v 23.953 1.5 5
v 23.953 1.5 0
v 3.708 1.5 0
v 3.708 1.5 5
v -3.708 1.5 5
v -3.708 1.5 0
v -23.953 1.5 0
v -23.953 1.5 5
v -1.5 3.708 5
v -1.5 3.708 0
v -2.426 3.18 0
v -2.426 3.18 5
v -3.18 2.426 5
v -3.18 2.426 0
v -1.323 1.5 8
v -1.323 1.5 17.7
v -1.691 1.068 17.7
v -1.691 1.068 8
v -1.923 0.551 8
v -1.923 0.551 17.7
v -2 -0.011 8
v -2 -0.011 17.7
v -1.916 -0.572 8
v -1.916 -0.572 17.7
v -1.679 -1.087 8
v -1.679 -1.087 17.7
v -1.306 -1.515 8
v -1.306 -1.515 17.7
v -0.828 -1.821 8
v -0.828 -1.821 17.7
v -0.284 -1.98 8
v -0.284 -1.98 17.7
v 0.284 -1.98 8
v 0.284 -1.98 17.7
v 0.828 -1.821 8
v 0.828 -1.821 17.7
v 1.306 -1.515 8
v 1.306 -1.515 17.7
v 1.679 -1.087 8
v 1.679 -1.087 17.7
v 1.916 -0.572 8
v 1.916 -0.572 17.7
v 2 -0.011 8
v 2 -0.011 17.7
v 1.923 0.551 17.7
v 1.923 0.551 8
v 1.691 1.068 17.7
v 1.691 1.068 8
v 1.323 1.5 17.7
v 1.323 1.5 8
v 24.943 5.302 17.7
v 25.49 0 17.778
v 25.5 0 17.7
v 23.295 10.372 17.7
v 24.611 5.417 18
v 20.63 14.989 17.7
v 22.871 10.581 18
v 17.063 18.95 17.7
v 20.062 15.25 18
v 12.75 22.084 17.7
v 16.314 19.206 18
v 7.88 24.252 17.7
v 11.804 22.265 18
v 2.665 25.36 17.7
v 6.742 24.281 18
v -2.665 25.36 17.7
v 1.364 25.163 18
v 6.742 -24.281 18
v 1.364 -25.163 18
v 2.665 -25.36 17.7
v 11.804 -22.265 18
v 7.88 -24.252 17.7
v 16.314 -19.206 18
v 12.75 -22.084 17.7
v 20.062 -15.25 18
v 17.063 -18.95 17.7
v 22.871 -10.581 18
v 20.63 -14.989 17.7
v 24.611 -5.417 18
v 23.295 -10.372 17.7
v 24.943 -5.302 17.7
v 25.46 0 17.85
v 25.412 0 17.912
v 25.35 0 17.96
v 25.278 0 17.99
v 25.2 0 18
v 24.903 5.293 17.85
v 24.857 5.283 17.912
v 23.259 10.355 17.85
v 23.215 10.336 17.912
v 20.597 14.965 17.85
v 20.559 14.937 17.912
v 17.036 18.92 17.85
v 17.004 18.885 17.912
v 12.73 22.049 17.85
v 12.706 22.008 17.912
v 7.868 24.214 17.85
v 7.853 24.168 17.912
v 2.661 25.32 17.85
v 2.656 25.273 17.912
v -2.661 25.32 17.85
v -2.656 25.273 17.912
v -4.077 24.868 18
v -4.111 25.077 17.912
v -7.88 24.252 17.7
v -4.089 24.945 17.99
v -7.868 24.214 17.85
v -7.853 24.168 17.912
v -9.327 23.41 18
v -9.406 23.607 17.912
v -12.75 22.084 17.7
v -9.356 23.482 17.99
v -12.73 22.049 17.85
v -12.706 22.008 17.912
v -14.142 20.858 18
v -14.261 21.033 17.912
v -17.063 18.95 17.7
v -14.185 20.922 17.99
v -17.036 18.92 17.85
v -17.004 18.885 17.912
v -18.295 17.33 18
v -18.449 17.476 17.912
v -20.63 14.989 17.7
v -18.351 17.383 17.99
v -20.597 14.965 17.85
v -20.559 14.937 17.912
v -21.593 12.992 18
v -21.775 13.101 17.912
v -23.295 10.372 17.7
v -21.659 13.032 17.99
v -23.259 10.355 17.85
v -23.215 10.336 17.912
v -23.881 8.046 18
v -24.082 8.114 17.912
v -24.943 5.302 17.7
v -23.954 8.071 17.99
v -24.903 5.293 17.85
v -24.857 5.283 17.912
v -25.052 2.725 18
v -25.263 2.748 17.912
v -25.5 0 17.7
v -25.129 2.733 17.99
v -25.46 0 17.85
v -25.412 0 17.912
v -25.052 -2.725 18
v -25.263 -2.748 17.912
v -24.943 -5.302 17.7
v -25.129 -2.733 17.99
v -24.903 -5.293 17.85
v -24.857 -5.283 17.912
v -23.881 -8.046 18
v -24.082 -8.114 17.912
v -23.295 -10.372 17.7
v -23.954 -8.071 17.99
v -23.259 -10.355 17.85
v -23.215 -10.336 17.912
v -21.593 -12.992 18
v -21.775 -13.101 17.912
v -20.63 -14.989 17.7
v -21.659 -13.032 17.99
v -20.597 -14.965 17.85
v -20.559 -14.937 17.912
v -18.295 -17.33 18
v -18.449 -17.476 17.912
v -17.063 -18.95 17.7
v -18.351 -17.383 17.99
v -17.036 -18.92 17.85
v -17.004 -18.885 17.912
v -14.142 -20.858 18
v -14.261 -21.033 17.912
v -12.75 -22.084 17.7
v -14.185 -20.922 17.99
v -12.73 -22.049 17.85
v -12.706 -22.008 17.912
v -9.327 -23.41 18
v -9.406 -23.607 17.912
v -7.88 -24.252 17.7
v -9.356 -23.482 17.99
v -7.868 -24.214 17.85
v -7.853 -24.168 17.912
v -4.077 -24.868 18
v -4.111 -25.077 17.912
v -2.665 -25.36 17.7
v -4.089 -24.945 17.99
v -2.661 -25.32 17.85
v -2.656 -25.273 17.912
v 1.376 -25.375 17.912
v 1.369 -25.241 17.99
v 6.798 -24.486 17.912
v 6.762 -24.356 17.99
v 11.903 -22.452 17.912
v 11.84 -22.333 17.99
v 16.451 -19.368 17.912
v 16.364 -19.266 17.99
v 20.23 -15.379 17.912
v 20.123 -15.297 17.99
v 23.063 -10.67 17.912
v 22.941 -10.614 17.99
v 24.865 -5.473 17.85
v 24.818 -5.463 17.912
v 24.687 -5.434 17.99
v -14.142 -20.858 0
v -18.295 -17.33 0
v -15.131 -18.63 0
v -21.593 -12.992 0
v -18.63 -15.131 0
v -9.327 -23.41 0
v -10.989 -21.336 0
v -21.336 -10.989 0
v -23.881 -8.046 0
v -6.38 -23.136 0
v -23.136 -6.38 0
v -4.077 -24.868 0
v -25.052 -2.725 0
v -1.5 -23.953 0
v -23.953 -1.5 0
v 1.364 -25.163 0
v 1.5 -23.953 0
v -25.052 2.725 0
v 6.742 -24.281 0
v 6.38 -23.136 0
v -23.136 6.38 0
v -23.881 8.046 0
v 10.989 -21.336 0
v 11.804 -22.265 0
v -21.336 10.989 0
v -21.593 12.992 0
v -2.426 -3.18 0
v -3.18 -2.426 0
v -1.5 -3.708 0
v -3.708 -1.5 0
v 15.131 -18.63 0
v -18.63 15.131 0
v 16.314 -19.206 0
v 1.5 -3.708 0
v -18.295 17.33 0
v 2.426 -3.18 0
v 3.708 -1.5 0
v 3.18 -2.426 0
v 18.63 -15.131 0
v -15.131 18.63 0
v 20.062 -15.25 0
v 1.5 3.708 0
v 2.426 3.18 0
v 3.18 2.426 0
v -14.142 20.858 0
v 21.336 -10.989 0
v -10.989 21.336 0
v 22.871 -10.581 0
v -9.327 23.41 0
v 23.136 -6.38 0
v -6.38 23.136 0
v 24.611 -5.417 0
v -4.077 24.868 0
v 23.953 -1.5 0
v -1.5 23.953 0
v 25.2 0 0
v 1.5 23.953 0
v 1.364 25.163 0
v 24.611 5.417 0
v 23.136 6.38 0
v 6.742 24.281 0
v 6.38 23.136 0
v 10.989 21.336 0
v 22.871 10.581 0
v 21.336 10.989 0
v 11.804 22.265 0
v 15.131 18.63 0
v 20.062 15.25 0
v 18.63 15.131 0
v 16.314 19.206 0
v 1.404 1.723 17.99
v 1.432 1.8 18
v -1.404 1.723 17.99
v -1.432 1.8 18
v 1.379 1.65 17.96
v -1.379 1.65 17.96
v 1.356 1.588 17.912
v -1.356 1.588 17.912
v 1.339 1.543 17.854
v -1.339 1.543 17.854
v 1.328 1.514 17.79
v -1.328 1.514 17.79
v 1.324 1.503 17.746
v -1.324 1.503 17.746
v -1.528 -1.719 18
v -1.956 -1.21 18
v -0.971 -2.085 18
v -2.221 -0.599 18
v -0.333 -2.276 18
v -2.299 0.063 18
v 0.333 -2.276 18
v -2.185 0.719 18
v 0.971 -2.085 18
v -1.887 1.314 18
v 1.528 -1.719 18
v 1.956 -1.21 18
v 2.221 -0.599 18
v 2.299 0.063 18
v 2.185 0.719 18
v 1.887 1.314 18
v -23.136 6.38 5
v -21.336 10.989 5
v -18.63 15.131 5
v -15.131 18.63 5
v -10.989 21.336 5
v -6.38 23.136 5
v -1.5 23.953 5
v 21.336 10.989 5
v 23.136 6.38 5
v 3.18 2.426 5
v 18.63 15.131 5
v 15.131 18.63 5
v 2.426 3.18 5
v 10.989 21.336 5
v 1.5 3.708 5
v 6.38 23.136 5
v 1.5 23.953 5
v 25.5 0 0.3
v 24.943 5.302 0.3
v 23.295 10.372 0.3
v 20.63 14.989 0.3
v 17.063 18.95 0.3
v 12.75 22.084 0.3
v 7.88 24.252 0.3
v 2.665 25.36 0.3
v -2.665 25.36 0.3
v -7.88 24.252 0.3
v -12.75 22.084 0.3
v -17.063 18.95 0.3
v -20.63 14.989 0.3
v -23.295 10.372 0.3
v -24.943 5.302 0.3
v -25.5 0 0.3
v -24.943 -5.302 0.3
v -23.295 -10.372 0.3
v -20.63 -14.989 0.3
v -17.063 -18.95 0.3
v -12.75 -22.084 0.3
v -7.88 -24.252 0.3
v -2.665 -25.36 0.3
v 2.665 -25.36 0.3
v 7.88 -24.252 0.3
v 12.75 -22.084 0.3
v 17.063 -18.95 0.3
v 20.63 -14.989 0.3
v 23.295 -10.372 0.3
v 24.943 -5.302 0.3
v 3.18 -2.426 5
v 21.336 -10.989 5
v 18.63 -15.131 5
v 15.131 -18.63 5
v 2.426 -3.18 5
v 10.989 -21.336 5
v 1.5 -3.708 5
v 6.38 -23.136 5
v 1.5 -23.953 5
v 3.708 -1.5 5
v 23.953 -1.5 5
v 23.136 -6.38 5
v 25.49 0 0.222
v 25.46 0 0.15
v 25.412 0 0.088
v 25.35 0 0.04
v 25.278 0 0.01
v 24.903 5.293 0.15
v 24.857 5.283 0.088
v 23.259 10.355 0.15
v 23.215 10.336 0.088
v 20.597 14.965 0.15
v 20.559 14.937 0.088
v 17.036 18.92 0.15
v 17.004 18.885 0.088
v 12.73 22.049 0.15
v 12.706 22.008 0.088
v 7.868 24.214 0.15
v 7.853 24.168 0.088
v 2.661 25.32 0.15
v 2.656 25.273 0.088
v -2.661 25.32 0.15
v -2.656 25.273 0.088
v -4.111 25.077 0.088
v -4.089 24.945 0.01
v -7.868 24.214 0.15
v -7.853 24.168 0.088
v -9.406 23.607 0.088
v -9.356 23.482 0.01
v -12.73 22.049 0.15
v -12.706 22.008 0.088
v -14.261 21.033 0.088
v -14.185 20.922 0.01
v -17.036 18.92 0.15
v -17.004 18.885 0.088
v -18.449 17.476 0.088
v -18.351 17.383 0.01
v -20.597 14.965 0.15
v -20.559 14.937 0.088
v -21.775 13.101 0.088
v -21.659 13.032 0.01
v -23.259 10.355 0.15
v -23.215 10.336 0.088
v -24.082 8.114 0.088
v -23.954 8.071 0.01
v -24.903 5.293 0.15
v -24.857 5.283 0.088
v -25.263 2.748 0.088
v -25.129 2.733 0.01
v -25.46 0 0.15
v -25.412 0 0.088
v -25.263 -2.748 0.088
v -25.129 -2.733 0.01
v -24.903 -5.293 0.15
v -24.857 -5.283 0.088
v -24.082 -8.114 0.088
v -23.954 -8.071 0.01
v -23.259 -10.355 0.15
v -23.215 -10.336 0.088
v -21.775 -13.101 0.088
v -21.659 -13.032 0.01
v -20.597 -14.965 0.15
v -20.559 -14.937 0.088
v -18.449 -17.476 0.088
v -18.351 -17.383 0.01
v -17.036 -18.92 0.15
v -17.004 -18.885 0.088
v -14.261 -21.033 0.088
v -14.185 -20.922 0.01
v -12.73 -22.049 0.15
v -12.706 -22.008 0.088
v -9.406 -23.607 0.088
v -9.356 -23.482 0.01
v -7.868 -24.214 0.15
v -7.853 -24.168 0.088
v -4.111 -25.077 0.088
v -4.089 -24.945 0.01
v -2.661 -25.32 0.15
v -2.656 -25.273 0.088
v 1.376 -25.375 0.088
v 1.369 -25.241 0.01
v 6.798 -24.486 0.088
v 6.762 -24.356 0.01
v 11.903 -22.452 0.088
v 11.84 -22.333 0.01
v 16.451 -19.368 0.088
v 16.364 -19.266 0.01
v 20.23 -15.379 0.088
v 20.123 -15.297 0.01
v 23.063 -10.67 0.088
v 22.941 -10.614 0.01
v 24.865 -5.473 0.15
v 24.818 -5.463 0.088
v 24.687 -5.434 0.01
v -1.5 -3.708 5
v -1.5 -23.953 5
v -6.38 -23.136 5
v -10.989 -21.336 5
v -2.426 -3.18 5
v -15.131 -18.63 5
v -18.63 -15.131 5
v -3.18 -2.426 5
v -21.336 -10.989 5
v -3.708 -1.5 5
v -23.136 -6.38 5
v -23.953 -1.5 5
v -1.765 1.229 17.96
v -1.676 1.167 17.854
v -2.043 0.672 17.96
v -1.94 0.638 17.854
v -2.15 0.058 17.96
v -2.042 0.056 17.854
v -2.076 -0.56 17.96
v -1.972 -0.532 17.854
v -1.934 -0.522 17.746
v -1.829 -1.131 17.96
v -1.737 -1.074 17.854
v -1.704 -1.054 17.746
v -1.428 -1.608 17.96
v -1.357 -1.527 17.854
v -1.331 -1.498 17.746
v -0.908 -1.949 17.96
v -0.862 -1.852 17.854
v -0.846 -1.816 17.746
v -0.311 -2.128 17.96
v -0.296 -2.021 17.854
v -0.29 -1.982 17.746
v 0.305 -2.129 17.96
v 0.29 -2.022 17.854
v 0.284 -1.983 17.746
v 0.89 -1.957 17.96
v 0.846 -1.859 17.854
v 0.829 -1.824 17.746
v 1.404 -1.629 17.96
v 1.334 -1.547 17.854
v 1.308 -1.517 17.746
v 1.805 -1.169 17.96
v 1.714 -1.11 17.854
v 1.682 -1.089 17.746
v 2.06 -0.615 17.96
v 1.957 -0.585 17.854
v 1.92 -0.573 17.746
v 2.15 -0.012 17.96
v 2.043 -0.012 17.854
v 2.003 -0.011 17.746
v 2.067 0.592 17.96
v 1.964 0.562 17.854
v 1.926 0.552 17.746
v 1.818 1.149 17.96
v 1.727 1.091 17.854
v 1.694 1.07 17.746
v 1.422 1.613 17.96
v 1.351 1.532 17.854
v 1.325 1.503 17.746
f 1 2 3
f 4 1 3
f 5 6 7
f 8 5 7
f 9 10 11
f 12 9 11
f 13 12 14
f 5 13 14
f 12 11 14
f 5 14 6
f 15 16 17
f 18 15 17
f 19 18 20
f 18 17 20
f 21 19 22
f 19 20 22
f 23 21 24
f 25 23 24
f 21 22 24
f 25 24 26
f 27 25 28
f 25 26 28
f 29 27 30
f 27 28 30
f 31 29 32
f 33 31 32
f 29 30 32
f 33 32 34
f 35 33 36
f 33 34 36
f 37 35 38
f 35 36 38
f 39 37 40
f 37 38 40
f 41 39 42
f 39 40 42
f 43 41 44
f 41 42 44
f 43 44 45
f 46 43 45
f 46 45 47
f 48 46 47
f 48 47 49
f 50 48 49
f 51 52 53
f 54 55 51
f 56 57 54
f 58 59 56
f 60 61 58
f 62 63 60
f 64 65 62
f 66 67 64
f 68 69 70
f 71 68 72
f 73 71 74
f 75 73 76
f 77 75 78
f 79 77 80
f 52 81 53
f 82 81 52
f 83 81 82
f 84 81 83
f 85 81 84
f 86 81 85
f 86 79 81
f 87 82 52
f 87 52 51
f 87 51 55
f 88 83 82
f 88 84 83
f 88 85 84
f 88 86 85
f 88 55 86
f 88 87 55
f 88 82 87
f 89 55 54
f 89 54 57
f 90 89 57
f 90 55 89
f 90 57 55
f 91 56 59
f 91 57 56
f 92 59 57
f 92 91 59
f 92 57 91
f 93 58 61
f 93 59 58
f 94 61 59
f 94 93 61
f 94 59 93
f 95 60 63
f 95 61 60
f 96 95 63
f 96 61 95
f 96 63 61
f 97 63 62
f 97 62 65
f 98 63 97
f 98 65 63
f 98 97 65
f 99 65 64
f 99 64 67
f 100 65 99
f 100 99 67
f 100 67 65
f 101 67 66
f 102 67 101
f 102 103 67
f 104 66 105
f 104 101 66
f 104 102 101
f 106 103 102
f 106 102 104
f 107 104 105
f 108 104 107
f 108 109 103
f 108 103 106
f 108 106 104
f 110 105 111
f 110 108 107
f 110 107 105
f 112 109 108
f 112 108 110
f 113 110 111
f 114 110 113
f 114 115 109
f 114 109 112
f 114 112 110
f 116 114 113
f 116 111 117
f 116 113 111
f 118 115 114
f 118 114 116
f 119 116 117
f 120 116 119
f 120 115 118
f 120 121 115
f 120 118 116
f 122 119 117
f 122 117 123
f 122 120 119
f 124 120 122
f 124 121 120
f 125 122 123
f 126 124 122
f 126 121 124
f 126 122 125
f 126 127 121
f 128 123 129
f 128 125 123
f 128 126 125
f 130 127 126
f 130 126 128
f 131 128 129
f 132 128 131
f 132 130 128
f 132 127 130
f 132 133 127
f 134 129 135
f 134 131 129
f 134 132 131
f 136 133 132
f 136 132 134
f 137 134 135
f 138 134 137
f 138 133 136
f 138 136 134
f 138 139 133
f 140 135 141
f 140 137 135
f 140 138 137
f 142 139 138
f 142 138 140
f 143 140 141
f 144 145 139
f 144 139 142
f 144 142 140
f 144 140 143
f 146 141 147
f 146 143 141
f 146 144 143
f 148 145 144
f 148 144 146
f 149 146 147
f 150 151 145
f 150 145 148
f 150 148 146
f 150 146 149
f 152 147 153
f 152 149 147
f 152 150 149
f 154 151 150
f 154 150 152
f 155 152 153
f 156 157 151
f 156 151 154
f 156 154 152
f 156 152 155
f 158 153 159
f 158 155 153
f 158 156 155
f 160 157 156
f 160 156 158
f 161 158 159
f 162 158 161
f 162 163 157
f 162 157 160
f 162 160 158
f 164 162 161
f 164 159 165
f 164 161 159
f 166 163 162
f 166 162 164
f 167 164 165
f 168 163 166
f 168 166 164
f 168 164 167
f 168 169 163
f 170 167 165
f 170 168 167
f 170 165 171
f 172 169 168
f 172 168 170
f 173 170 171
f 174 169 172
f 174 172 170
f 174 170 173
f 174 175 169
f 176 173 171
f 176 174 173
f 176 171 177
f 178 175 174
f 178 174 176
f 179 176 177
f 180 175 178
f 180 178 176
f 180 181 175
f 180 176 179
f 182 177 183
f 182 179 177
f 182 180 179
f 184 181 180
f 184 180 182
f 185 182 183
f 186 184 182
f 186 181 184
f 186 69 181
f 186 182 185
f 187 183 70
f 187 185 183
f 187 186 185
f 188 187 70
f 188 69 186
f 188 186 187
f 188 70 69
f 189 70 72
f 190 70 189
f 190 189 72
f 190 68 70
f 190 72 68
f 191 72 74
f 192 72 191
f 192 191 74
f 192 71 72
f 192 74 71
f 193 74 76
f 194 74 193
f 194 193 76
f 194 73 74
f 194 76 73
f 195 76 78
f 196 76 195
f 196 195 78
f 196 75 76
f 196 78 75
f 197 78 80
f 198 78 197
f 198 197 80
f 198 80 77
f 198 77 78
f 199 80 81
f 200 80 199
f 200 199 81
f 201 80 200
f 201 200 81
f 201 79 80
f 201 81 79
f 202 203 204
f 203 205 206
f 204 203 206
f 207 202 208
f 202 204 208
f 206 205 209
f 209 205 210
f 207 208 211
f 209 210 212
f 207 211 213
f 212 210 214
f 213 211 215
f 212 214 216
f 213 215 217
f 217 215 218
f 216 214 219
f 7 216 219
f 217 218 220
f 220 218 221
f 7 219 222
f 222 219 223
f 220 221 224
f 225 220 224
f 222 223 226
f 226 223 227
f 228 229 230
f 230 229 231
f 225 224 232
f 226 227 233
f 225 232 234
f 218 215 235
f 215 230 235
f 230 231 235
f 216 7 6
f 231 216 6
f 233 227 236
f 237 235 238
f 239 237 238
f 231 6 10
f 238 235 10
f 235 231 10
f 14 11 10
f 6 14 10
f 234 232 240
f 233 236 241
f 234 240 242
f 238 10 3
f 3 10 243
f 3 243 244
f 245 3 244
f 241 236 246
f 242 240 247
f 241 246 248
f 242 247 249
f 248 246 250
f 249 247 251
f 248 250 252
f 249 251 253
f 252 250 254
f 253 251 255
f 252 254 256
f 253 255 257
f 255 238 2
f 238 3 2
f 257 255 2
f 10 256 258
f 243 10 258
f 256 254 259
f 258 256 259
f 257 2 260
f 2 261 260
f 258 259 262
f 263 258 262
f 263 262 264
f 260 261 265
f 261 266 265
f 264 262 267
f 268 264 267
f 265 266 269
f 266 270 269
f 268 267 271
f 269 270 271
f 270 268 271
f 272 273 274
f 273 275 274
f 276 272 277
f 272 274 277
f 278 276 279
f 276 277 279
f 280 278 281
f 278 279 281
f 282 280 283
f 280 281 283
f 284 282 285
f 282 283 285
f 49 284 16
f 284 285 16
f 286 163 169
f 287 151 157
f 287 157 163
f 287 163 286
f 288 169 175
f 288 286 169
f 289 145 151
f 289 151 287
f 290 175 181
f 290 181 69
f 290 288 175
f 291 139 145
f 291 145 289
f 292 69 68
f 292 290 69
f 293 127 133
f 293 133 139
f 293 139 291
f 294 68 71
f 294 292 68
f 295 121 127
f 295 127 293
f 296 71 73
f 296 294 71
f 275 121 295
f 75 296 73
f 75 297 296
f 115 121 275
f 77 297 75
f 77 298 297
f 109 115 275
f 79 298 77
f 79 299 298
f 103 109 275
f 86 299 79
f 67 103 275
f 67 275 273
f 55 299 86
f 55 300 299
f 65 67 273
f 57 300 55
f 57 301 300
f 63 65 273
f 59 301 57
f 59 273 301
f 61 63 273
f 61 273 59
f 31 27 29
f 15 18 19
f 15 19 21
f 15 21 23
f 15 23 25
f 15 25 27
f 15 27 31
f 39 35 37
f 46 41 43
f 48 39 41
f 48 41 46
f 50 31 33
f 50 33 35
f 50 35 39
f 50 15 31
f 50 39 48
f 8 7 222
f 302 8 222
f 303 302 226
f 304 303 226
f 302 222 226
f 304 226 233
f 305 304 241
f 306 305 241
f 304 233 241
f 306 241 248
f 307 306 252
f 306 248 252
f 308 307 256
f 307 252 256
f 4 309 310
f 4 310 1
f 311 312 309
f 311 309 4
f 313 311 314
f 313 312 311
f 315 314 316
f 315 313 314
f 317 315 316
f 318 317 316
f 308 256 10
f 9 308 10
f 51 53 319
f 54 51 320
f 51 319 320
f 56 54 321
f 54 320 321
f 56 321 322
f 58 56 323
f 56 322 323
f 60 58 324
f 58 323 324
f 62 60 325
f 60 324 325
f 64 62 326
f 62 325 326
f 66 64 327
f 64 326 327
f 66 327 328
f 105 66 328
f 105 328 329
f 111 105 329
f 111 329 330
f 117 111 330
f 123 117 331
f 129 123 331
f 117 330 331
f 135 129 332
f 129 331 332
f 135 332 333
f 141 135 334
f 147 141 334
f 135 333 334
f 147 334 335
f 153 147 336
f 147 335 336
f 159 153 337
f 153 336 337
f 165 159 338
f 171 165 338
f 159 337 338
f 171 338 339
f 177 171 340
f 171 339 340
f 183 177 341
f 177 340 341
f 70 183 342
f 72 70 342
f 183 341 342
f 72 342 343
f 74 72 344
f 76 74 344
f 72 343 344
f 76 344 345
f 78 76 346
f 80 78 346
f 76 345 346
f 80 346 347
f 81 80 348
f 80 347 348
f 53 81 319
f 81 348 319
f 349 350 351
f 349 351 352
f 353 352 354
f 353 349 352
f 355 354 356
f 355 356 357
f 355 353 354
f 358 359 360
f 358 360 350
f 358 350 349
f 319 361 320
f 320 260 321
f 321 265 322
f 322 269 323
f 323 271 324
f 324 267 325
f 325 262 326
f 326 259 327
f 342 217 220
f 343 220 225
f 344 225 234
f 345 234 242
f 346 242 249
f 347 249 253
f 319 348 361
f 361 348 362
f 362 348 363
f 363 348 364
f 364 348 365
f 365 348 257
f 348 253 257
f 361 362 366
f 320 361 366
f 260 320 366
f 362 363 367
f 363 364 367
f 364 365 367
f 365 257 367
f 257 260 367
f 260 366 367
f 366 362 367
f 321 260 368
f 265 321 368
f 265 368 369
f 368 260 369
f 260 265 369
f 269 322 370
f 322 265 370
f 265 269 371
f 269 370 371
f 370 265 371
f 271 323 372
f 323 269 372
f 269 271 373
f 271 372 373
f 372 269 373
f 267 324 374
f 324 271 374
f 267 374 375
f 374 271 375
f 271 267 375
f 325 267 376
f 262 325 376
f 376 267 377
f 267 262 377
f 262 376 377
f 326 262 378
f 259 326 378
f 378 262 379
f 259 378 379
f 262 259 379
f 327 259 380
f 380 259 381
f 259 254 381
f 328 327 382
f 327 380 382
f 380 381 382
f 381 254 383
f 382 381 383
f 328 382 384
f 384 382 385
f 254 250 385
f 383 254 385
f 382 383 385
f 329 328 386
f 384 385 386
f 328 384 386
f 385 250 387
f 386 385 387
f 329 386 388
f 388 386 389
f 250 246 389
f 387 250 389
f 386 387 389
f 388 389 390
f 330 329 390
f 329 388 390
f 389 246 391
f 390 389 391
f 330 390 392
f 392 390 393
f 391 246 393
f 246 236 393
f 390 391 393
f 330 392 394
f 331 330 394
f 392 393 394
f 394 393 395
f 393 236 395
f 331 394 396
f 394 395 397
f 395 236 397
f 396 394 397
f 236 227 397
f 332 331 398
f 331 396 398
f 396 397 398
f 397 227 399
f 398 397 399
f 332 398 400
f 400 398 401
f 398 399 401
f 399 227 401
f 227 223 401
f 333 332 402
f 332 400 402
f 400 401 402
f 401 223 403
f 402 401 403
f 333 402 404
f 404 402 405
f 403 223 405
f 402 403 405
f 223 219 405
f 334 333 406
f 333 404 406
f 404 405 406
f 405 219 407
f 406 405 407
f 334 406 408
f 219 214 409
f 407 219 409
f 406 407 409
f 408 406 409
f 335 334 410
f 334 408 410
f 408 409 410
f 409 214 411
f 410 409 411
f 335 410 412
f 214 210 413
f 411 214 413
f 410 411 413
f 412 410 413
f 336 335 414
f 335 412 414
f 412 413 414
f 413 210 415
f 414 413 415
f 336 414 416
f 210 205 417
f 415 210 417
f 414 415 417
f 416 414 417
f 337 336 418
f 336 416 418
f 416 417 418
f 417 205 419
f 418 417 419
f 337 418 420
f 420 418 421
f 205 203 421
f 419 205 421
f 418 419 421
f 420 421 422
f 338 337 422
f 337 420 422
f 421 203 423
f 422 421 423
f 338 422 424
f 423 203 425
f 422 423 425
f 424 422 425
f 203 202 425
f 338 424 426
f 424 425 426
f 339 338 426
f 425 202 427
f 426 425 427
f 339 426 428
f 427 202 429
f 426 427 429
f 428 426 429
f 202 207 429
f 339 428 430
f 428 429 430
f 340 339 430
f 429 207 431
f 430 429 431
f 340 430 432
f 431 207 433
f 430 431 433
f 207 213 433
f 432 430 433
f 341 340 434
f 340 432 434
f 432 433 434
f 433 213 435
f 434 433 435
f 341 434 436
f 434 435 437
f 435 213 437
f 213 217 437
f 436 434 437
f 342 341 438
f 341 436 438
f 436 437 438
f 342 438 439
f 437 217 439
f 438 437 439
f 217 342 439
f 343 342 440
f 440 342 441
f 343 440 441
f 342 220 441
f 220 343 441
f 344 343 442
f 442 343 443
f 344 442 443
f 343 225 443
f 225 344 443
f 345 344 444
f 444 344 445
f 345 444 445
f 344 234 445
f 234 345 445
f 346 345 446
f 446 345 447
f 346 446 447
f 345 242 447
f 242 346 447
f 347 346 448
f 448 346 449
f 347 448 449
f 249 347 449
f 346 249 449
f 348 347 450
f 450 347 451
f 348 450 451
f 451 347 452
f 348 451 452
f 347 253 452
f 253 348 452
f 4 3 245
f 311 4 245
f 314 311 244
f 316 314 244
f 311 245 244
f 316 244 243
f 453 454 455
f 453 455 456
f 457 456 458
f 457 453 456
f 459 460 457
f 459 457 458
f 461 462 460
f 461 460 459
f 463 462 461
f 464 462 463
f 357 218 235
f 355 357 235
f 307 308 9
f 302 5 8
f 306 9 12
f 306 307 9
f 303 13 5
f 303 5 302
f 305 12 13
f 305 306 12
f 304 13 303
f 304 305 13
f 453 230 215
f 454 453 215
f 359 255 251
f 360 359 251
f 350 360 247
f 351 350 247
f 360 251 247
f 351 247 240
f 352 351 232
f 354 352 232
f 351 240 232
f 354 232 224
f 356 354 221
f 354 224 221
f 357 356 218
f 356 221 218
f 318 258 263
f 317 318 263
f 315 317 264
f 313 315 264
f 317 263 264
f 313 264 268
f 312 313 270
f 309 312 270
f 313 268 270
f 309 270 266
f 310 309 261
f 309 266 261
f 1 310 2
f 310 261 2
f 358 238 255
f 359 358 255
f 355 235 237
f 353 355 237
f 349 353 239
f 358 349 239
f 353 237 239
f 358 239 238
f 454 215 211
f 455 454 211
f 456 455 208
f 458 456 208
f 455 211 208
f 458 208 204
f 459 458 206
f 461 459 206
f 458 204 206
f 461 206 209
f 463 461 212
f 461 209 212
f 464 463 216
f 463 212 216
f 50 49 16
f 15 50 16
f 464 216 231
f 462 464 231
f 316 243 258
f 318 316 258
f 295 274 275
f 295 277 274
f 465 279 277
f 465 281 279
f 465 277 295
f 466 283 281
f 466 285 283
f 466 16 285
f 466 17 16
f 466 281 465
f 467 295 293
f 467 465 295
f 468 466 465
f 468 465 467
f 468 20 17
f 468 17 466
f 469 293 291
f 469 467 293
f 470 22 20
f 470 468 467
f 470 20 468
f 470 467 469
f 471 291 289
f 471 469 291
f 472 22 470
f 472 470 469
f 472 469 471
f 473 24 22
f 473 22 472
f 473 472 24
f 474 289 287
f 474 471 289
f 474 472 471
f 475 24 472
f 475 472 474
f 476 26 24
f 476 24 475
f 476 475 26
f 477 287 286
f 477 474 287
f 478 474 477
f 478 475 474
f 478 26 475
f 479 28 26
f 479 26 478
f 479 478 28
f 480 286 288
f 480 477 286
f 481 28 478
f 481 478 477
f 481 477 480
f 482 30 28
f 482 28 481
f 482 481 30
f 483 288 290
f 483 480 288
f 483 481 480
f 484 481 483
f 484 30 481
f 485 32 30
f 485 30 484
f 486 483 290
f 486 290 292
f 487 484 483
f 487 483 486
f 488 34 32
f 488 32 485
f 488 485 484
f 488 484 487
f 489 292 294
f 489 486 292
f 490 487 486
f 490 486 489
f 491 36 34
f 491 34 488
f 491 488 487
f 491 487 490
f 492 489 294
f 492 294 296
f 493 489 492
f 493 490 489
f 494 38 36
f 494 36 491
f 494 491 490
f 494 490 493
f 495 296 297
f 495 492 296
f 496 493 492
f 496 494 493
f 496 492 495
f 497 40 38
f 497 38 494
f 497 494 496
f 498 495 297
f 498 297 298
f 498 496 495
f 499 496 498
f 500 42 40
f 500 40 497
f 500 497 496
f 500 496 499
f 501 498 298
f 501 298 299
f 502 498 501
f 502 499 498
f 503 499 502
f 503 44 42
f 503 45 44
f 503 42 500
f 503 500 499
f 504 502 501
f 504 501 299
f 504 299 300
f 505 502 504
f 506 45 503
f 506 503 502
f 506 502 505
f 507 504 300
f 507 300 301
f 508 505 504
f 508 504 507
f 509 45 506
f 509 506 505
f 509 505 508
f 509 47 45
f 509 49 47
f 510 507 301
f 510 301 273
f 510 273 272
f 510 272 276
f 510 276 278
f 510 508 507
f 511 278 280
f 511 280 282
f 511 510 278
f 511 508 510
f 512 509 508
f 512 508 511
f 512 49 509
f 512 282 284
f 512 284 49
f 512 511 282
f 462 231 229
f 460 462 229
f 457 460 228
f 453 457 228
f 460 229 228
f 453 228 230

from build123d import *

# Parameters (mm, degrees)
ESQUISSE1_R             = 25.5
BOSS_EXTRU_1_DEPTH      = 18
ENL_V_MAT_EXTRU_2_DEPTH = 10
ENL_V_MAT_EXTRU_4_DEPTH = 5
CONG_1_R                = 0.3


with BuildPart() as part:
    # Esquisse1 → Boss.-Extru.1 (new body)
    with BuildSketch(Plane.XY):
        Circle(ESQUISSE1_R)
    extrude(amount=BOSS_EXTRU_1_DEPTH)

    # Esquisse2 → Enlèv. mat.-Extru.2 (cut)
    with BuildSketch(Plane.XY.offset(18)):
        with BuildLine():
            Line((1.322875656, 1.5), (-1.322875656, 1.5))
            ThreePointArc((-1.322875656, 1.5), (0, -2), (1.322875656, 1.5))
        make_face()
    extrude(amount=-ENL_V_MAT_EXTRU_2_DEPTH, mode=Mode.SUBTRACT)

    # Esquisse3 → Enlèv. mat.-Extru.4 (cut)
    with BuildSketch(Plane(origin=(0, 0, 0), x_dir=(-1, 0, 0), z_dir=(0, 0, -1))):
        with BuildLine():
            ThreePointArc((1.5, 3.708324452), (2.828574751, 2.828574751), (3.708324452, 1.5))
            Line((3.708324452, 1.5), (23.953079134, 1.5))
            ThreePointArc((23.953079134, 1.5), (16.970562748, 16.970562748), (1.5, 23.953079134))
            Line((1.5, 23.953079134), (1.5, 3.708324452))
        make_face()
        with BuildLine():
            Line((-23.953079134, 1.5), (-3.708324452, 1.5))
            ThreePointArc((-3.708324452, 1.5), (-2.828574751, 2.828574751), (-1.5, 3.708324452))
            Line((-1.5, 3.708324452), (-1.5, 23.953079134))
            ThreePointArc((-1.5, 23.953079134), (-16.970562748, 16.970562748), (-23.953079134, 1.5))
        make_face()
        with BuildLine():
            Line((-1.5, -23.953079134), (-1.5, -3.708324452))
            ThreePointArc((-1.5, -3.708324452), (-2.828574751, -2.828574751), (-3.708324452, -1.5))
            Line((-3.708324452, -1.5), (-23.953079134, -1.5))
            ThreePointArc((-23.953079134, -1.5), (-16.970562748, -16.970562748), (-1.5, -23.953079134))
        make_face()
        with BuildLine():
            ThreePointArc((3.708324452, -1.5), (2.828574751, -2.828574751), (1.5, -3.708324452))
            Line((1.5, -3.708324452), (1.5, -23.953079134))
            ThreePointArc((1.5, -23.953079134), (16.970562748, -16.970562748), (23.953079134, -1.5))
            Line((23.953079134, -1.5), (3.708324452, -1.5))
        make_face()
    extrude(amount=-ENL_V_MAT_EXTRU_4_DEPTH, mode=Mode.SUBTRACT)

    # Congé1
    cong_1_edges = [part.edges().sort_by_distance(p)[0] for p in [
        (-25.5, 0, 0),
        (-25.5, 0, 18),
        (0, -2, 18),
        (0, 1.5, 18),
    ]]
    fillet(cong_1_edges, radius=CONG_1_R)


solid = part.part
